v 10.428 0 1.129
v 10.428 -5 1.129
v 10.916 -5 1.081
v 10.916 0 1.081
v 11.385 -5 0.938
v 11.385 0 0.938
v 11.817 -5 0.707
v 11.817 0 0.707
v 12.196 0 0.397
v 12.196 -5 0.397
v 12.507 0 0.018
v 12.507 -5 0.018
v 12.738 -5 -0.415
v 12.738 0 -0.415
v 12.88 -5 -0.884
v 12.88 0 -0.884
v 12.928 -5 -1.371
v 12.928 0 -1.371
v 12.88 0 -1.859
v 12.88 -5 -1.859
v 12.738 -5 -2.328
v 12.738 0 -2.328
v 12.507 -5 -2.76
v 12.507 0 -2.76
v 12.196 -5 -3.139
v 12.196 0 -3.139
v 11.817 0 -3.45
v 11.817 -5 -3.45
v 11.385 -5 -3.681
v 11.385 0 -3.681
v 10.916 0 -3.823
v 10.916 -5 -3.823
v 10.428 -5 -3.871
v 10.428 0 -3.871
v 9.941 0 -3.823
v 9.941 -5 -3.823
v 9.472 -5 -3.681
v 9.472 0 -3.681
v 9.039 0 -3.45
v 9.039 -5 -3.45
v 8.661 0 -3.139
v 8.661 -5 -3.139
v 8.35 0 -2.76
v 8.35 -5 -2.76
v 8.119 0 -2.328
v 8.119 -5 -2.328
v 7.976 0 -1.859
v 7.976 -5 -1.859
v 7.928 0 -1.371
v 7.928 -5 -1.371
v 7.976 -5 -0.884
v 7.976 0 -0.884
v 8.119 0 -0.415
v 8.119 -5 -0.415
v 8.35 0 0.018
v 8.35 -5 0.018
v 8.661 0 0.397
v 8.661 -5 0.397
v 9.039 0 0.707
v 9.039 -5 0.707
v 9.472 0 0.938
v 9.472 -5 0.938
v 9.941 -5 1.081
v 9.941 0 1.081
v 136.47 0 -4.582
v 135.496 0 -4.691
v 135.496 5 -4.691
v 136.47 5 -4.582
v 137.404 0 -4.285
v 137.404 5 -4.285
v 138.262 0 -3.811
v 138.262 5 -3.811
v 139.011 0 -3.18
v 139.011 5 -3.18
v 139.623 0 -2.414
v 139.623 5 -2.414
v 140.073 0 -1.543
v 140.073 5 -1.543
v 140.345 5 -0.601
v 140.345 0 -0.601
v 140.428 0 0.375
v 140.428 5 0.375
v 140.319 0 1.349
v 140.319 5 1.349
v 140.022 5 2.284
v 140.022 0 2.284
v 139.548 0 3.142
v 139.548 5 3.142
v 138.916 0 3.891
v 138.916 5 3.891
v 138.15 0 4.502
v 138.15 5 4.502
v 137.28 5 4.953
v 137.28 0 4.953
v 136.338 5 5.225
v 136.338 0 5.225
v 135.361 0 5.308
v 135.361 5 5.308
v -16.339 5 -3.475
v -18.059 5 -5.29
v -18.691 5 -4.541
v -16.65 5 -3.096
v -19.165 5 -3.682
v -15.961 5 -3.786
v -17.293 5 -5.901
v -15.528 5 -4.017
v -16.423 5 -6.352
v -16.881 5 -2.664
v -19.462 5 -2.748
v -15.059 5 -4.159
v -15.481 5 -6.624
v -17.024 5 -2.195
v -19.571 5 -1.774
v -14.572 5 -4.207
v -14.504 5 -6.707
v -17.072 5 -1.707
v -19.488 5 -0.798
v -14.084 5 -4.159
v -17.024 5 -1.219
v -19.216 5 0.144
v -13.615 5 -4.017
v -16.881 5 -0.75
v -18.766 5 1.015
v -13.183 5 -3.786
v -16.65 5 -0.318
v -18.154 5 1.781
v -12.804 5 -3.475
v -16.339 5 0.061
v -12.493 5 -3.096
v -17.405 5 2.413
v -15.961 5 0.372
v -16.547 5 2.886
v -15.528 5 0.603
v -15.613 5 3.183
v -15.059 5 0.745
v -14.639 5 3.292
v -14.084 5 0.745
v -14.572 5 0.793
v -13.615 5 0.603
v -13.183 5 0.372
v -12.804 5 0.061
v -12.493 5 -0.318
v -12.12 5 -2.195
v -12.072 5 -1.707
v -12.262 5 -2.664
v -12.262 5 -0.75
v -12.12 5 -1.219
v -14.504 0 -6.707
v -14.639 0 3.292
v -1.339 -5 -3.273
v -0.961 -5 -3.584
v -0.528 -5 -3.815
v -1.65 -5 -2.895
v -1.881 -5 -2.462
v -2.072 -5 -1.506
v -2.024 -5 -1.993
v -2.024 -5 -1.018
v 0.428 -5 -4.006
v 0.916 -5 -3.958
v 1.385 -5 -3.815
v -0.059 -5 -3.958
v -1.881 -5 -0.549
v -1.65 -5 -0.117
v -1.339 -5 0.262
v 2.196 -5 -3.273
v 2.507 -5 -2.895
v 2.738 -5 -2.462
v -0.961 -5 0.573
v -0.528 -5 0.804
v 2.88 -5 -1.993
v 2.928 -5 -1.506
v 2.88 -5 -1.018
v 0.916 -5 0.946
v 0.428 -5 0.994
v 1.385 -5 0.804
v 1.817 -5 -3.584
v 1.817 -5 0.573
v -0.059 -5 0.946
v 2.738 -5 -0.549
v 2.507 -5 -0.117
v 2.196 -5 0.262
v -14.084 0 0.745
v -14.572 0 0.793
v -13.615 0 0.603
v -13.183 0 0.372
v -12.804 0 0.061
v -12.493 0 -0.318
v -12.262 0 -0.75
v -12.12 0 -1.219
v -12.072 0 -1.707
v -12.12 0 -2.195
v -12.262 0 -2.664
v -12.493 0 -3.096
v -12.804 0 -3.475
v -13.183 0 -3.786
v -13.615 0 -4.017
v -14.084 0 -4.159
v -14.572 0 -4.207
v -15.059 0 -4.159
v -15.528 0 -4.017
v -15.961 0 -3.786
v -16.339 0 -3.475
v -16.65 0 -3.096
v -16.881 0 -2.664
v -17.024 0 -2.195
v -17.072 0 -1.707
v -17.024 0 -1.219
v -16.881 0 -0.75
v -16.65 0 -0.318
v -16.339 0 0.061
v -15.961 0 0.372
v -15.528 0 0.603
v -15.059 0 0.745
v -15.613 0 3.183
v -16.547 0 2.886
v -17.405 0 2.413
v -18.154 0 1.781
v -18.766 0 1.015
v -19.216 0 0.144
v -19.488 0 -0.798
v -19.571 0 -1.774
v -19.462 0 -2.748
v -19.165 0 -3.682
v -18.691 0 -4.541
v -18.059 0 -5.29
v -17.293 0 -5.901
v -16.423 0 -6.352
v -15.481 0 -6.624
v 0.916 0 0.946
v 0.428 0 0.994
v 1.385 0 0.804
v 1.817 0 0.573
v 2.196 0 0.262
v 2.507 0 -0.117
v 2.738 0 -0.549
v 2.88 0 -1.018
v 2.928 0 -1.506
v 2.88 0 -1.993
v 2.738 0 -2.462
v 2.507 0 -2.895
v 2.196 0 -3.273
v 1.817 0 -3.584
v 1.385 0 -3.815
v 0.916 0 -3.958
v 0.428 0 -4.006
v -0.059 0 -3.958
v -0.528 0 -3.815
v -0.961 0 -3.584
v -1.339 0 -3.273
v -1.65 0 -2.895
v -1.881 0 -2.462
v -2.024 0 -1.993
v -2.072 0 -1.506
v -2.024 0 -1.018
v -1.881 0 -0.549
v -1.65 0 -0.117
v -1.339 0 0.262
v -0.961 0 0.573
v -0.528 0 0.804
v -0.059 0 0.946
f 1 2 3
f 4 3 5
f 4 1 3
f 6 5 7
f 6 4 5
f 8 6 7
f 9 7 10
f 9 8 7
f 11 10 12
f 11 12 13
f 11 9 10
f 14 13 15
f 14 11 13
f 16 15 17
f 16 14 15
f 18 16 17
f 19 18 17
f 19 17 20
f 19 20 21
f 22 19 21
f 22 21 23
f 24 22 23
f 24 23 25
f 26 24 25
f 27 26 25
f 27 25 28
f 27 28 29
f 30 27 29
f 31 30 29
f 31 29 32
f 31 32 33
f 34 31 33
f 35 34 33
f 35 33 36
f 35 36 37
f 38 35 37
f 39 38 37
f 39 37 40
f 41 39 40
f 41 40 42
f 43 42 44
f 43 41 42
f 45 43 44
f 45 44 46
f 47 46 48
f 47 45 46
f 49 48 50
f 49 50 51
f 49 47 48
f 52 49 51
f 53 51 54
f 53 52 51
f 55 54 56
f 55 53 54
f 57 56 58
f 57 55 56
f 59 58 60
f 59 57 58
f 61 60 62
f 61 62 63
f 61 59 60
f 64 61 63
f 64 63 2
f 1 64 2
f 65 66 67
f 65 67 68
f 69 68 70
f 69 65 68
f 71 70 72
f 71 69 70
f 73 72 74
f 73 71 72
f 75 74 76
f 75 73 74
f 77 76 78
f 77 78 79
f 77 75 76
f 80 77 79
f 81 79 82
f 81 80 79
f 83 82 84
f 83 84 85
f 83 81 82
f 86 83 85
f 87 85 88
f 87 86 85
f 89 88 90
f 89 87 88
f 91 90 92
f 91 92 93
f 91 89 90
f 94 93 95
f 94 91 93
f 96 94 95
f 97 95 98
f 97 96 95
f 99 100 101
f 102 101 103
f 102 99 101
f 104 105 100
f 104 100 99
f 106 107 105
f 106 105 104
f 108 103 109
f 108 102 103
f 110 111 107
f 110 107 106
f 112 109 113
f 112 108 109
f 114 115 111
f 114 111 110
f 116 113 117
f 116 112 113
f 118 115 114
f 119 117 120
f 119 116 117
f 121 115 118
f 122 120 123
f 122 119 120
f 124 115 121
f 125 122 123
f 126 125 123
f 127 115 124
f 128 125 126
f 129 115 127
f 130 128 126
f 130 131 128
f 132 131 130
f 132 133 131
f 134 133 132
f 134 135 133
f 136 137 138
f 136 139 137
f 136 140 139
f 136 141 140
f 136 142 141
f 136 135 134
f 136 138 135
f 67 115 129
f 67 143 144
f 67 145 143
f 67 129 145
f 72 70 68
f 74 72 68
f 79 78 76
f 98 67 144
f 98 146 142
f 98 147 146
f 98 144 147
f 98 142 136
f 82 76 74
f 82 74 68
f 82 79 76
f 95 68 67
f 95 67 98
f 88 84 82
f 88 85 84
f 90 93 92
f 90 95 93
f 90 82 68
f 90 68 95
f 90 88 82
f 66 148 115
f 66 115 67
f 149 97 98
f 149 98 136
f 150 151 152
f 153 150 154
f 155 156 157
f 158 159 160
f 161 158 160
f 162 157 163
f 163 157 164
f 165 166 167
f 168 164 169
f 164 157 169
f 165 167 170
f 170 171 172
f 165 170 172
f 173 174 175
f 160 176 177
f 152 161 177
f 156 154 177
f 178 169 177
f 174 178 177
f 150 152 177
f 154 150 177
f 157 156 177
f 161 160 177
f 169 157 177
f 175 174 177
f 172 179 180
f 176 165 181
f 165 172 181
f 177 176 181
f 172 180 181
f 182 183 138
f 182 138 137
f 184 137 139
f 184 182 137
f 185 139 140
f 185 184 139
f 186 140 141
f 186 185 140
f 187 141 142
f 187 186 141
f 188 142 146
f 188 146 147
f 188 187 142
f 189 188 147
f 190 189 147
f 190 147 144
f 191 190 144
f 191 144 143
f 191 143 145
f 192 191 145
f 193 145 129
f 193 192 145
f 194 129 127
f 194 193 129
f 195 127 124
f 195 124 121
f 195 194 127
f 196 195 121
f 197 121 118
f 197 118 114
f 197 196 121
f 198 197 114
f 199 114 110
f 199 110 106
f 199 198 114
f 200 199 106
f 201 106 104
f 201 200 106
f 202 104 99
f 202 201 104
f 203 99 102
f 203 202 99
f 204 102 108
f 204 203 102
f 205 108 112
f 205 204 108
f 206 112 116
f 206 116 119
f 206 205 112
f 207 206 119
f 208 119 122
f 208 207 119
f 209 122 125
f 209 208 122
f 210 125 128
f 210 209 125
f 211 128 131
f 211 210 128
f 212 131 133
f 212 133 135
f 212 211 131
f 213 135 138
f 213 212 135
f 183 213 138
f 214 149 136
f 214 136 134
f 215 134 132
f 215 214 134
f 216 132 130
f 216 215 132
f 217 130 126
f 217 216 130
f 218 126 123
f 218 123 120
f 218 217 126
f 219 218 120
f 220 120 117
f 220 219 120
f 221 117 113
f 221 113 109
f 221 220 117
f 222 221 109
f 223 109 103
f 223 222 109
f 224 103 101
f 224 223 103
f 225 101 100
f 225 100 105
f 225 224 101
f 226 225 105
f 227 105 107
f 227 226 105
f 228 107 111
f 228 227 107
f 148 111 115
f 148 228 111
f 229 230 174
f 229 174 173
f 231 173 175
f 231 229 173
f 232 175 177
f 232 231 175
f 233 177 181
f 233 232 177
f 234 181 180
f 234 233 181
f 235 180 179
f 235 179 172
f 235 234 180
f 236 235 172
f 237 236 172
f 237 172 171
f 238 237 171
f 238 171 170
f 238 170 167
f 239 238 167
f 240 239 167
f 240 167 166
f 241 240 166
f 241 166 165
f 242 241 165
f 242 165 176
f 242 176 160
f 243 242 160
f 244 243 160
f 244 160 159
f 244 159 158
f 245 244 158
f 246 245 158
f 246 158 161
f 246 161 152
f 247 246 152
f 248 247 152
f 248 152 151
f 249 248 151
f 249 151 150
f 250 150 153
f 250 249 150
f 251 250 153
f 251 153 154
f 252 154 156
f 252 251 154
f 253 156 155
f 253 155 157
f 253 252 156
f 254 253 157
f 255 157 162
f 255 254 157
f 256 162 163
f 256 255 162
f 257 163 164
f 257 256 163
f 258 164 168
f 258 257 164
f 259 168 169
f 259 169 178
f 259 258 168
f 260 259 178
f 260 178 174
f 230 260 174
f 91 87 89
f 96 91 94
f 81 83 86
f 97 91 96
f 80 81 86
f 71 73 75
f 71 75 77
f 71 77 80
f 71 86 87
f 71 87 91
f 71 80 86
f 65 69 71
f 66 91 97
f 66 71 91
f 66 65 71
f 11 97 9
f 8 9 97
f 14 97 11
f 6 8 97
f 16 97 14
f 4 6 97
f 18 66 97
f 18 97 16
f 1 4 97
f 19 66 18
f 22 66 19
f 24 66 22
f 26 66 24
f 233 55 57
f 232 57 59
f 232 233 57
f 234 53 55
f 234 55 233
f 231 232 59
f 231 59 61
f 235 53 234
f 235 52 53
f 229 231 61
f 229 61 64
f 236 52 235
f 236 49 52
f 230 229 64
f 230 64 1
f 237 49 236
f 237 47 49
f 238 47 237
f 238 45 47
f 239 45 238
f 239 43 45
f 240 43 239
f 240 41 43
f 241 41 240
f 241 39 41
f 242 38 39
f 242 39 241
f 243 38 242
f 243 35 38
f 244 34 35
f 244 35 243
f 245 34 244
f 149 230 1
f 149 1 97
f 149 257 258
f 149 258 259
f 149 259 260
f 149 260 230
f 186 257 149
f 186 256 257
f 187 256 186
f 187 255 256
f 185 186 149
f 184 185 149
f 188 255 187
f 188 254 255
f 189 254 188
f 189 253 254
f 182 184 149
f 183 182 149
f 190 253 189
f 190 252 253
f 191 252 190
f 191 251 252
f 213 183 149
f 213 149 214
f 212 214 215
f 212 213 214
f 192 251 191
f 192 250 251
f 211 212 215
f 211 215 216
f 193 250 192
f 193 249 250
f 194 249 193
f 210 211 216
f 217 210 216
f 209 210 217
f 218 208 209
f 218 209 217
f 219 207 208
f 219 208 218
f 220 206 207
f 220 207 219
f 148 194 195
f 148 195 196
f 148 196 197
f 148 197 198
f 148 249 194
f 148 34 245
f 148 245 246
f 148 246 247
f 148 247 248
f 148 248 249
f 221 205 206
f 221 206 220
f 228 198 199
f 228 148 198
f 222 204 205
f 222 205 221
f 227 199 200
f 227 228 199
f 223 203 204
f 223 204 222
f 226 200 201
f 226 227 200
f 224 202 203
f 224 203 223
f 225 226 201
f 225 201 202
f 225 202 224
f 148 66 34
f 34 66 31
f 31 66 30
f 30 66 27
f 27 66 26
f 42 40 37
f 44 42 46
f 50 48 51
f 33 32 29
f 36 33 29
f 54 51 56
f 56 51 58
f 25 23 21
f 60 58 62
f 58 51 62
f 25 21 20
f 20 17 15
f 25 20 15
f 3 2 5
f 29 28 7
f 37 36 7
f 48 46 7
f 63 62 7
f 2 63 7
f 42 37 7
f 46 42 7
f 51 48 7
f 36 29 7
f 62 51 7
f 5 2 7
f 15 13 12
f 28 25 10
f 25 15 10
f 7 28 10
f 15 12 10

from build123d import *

# Parameters (mm, degrees)
SKETCH1_R           = 2.5
BOSS_EXTRUDE1_DEPTH = 5
SKETCH2_R           = 2.5
BOSS_EXTRUDE2_DEPTH = 10


with BuildPart() as part:
    # Sketch1 → Boss-Extrude1 (new body)
    with BuildSketch(Plane(origin=(0, 0, 0), x_dir=(1, 0, 0), z_dir=(0, 1, 0))):
        with BuildLine():
            Line((-14.504443595, 6.706697569), (135.495556405, 4.691342482))
            ThreePointArc((135.495556405, 4.691342482), (140.42793273, -0.375378724), (135.361211524, -5.30775505))
            Line((135.361211524, -5.30775505), (-14.638788476, -3.292399963))
            ThreePointArc((-14.638788476, -3.292399963), (-19.571164802, 1.774321243), (-14.504443595, 6.706697569))
        make_face()
        with Locations(Location((-14.571616036, 1.707148803, 0), (0, 0, 270))):
            Circle(SKETCH1_R, mode=Mode.SUBTRACT)
    extrude(amount=BOSS_EXTRUDE1_DEPTH)

    # Sketch2 → Boss-Extrude2 (add)
    with BuildSketch(Plane(origin=(0, 5, 0), x_dir=(1, 0, 0), z_dir=(0, 1, 0))):
        with Locations(Location((0.428383964, 1.505613294, 0), (0, 0, 270))):
            Circle(SKETCH2_R)
        with Locations(Location((10.428383964, 1.371256288, 0), (0, 0, 270))):
            Circle(SKETCH2_R)
    extrude(amount=-BOSS_EXTRUDE2_DEPTH)


solid = part.part
